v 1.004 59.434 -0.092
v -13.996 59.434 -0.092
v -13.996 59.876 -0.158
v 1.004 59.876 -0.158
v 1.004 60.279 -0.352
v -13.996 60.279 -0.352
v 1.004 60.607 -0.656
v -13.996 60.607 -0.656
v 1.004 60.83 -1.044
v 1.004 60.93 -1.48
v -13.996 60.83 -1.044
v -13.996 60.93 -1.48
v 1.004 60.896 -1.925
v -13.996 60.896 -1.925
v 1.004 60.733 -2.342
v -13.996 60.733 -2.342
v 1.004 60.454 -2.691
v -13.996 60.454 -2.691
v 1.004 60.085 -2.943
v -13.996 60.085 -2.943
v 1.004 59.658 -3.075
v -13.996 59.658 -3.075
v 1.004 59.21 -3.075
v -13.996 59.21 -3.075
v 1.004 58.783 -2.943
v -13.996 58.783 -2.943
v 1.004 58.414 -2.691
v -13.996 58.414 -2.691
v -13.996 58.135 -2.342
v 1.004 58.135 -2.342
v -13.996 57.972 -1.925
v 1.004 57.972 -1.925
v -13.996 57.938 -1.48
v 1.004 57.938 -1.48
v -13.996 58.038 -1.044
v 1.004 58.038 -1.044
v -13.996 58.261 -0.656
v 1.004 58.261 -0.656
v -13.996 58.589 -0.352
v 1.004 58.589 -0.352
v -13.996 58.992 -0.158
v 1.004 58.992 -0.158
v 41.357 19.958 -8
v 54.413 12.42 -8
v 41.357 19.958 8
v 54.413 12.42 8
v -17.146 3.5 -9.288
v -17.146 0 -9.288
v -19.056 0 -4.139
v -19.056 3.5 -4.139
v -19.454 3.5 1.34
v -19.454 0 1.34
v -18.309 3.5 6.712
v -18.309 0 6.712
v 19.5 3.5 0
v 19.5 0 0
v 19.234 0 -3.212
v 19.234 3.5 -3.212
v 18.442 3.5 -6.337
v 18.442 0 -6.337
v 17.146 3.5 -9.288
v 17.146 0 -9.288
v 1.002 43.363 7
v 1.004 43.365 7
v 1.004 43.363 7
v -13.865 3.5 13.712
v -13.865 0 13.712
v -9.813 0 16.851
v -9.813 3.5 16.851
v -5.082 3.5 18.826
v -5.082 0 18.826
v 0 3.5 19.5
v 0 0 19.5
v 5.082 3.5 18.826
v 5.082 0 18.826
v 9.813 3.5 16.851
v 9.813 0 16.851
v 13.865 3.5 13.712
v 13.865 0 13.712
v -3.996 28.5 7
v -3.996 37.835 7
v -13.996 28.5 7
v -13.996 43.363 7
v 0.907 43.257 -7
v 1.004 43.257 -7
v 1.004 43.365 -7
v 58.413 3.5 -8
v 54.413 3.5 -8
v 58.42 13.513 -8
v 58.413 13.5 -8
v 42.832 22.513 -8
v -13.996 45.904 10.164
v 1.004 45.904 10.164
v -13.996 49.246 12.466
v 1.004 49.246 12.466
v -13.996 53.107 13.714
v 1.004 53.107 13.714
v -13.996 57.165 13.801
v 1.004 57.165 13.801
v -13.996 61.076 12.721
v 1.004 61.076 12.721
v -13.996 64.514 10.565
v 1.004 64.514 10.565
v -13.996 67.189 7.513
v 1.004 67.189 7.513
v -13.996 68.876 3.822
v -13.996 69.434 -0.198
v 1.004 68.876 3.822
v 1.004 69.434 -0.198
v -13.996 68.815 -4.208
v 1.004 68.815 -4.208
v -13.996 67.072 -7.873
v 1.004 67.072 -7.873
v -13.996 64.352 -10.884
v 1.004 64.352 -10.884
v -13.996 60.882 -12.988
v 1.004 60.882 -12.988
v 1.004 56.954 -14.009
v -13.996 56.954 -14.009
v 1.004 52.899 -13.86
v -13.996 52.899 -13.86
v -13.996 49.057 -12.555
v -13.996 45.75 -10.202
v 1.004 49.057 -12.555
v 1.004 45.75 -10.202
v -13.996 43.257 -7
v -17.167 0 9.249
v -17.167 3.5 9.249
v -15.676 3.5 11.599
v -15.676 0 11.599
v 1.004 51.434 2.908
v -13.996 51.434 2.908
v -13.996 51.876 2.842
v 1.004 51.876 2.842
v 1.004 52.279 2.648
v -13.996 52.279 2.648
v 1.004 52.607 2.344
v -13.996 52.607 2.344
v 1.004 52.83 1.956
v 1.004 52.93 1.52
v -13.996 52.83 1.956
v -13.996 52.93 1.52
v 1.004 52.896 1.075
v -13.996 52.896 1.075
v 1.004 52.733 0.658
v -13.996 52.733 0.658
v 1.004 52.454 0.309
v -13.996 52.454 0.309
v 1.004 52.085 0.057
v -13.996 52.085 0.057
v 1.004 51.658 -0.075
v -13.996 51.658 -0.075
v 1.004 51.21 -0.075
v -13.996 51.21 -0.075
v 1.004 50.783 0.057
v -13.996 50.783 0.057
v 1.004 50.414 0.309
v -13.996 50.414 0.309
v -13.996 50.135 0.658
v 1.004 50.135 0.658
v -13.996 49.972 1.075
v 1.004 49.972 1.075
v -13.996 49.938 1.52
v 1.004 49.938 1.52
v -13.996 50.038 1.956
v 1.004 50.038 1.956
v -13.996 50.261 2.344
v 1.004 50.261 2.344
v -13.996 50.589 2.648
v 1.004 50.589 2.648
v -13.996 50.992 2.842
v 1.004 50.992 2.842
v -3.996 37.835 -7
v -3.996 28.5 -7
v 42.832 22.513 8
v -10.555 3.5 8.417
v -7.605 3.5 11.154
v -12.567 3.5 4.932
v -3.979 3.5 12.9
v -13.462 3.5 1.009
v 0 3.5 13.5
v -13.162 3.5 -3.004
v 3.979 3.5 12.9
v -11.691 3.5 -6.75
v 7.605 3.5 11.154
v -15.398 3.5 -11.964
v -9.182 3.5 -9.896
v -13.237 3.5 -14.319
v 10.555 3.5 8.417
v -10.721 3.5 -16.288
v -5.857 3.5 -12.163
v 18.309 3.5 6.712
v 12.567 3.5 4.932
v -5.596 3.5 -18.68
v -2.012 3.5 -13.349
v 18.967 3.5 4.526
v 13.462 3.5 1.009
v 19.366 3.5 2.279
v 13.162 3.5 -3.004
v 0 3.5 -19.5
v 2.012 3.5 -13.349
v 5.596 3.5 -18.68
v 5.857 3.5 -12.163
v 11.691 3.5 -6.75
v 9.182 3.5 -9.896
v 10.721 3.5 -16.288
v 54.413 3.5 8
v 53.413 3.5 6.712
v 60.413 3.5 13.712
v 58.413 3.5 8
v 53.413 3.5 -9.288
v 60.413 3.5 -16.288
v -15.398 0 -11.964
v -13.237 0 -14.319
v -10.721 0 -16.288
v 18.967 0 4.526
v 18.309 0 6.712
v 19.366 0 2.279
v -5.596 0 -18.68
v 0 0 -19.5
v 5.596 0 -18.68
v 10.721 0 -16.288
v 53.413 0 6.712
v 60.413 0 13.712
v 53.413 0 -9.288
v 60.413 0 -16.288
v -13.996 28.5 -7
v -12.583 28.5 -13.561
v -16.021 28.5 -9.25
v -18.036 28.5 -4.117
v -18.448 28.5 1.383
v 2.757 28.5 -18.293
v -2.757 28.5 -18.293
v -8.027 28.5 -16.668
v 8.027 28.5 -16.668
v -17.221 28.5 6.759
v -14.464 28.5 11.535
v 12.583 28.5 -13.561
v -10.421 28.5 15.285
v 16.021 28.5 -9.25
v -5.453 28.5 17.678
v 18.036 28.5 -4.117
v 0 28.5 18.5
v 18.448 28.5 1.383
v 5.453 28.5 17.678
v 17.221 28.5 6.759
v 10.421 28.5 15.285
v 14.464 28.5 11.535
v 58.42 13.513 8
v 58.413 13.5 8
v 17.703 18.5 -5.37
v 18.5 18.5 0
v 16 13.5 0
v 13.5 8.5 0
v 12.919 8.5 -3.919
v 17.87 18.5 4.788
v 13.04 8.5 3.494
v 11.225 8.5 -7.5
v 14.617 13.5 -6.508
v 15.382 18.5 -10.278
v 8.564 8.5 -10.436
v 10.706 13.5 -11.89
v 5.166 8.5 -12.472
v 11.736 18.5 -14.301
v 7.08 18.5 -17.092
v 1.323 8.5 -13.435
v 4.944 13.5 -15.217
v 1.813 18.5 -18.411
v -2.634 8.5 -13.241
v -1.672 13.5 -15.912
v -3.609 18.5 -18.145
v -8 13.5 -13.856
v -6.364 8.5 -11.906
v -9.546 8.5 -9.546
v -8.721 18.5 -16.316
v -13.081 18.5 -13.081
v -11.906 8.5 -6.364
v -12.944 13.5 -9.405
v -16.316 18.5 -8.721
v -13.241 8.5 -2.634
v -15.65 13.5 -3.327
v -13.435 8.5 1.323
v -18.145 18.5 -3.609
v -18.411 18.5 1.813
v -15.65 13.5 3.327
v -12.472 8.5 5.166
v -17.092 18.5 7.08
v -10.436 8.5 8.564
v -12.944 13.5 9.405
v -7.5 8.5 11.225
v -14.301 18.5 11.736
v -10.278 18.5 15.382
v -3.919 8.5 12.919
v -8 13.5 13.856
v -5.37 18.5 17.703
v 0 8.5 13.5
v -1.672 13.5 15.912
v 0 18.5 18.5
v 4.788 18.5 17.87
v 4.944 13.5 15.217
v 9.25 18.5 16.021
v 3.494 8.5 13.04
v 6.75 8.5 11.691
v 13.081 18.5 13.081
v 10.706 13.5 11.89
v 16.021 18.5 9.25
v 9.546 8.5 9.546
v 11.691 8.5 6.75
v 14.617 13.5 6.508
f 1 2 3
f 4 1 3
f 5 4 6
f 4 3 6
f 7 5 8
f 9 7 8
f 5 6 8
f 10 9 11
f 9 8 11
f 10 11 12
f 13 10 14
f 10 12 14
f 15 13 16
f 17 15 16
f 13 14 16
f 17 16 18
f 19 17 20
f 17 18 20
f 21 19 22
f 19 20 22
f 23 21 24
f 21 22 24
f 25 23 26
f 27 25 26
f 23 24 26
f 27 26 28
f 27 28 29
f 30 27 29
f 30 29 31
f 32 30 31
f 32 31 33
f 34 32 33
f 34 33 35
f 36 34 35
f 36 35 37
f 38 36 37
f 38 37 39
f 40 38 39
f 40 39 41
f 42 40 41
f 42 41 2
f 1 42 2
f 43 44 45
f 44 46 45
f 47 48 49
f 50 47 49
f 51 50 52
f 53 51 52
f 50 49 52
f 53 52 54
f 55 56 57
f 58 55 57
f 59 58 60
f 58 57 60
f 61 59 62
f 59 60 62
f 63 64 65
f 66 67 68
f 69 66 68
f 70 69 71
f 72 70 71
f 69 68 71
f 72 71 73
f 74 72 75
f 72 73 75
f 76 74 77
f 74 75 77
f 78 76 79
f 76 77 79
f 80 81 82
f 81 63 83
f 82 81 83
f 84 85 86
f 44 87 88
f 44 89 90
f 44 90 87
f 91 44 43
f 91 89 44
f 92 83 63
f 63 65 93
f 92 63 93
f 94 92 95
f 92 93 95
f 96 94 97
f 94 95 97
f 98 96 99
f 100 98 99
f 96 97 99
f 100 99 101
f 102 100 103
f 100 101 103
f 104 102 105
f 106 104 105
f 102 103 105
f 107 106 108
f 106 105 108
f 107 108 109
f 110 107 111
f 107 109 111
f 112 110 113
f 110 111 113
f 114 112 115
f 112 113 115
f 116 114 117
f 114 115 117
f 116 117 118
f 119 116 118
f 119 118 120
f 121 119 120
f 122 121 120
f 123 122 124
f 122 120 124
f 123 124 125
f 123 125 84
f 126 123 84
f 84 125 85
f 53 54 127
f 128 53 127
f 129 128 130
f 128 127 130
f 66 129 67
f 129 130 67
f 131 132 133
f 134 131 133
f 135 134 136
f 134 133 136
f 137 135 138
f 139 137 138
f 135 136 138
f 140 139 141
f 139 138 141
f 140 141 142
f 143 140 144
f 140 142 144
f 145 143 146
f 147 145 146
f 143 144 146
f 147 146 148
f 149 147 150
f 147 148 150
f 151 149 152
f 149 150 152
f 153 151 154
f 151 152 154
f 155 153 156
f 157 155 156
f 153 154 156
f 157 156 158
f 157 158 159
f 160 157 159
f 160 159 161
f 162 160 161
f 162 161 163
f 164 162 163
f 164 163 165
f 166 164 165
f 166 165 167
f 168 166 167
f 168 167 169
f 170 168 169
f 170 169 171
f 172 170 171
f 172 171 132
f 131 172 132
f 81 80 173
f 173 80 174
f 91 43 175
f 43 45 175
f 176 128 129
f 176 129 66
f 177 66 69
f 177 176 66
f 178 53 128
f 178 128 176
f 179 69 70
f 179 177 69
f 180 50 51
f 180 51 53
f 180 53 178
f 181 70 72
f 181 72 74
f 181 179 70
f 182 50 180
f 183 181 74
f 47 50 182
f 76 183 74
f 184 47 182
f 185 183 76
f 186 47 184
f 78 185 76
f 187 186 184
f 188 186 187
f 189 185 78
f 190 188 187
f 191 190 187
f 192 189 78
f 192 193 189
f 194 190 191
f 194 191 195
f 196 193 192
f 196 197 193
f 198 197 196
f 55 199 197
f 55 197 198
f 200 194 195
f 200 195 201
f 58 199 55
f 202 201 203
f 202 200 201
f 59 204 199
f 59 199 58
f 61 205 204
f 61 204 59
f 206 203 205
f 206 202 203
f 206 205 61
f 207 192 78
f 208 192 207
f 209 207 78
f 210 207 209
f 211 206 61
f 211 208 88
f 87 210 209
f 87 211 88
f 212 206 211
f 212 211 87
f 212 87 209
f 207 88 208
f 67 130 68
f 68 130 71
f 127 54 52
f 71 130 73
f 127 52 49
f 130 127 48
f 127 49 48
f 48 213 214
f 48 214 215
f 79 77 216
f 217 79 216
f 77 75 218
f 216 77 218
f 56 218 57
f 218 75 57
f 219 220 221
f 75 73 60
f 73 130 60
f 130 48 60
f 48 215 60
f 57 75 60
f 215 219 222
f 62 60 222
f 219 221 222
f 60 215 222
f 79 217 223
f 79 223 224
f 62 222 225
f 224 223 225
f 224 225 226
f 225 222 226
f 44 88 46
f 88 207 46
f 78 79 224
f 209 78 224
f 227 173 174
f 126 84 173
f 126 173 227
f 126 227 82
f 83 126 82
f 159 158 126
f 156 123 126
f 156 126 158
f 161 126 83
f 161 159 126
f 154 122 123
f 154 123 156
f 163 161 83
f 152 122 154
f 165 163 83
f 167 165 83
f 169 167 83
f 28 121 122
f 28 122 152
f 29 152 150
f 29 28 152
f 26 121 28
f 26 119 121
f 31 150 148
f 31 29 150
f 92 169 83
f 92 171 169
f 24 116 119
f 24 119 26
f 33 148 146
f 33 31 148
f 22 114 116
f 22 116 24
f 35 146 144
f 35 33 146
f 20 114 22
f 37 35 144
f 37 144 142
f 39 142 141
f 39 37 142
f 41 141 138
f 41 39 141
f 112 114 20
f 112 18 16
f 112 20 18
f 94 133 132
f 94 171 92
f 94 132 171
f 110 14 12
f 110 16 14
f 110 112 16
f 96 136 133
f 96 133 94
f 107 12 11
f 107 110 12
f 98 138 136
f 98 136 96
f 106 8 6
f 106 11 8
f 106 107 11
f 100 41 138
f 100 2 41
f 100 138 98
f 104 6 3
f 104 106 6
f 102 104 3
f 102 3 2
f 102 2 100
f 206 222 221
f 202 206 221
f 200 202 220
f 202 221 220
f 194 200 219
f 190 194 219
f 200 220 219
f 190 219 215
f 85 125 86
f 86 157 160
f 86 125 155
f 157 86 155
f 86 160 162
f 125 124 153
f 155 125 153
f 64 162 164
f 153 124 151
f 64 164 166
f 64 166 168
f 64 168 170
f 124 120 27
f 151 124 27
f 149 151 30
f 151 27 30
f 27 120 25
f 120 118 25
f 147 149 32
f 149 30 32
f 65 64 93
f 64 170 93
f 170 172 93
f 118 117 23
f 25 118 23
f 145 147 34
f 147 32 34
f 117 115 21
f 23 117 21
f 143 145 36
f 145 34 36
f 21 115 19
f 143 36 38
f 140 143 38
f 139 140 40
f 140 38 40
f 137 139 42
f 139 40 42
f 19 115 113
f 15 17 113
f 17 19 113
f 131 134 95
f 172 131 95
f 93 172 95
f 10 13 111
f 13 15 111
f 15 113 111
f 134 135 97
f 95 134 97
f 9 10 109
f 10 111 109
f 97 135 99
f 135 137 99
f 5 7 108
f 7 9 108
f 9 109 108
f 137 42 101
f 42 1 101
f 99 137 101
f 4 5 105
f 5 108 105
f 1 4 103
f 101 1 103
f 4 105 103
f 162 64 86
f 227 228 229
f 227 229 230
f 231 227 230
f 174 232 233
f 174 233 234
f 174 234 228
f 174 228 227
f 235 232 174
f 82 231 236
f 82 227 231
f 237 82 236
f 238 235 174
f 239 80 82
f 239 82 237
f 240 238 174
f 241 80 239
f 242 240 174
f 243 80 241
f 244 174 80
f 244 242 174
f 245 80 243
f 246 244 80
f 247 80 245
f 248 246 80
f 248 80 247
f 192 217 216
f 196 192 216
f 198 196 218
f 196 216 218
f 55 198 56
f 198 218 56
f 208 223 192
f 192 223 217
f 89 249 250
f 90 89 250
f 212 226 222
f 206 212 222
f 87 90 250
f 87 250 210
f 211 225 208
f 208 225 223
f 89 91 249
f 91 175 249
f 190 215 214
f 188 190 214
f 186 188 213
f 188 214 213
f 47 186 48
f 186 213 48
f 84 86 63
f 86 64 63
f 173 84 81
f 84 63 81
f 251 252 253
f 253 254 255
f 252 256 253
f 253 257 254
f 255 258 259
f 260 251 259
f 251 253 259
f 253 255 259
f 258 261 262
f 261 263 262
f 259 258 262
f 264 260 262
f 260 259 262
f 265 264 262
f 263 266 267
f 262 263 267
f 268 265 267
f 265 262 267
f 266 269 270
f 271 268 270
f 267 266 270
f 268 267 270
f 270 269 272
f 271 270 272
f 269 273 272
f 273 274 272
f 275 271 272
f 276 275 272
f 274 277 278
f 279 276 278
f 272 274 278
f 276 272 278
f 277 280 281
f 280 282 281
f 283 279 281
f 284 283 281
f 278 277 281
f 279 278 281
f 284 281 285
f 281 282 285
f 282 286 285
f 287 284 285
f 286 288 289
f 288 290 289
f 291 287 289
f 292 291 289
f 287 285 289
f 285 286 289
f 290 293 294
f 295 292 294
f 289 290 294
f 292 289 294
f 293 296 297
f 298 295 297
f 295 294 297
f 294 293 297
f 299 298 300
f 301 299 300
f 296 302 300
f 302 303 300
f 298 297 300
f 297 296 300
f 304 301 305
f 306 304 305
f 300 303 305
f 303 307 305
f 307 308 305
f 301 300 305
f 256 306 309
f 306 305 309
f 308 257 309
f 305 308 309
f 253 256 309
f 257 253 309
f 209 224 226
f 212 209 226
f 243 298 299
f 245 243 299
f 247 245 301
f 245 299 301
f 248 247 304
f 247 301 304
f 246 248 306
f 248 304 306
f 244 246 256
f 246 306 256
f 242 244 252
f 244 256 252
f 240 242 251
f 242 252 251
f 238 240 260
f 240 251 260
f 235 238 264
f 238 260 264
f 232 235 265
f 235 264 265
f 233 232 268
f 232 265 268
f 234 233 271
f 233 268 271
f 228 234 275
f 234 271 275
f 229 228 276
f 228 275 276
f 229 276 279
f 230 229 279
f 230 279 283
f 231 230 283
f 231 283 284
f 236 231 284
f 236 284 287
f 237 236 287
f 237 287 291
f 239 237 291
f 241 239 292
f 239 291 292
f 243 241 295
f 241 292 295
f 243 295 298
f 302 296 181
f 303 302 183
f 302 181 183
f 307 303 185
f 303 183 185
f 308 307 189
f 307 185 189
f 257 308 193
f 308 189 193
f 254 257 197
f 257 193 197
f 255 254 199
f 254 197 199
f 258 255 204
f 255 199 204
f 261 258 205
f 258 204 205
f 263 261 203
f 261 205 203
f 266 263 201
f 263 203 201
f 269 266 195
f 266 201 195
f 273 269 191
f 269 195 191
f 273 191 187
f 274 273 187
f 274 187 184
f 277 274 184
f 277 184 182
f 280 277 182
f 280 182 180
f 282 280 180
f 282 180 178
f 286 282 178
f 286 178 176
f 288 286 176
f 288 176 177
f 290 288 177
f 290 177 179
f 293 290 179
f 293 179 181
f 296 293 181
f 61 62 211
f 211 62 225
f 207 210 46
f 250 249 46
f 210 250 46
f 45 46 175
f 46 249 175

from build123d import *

# Parameters (mm, degrees)
SALIENTE_EXTRUIR1_DEPTH = 3.5
CROQUIS2_R              = 13.5
SALIENTE_EXTRUIR2_DEPTH = 5
CROQUIS4_R              = 18.5
CROQUIS5_R              = 13.5
CROQUIS6_R              = 18.5
SALIENTE_EXTRUIR3_DEPTH = 10
CROQUIS7_W              = 10
CROQUIS7_H              = 14
SALIENTE_EXTRUIR4_DEPTH = 9.335
SALIENTE_EXTRUIR5_DEPTH = 7
SALIENTE_EXTRUIR6_DEPTH = 15
SALIENTE_EXTRUIR7_DEPTH = 8
CROQUIS11_R             = 1.5
CORTAR_EXTRUIR1_DEPTH   = 104.624142837


with BuildPart() as part:
    # Croquis1 → Saliente-Extruir1 (new body)
    with BuildSketch(Plane(origin=(0, 0, 0), x_dir=(1, 0, 0), z_dir=(0, 1, 0))):
        with BuildLine():
            Line((13.865110625, -13.711626722), (60.412611283, -13.711626722))
            Line((60.412611283, -13.711626722), (60.412611283, 16.288373278))
            Line((60.412611283, 16.288373278), (10.720955925, 16.288373278))
            ThreePointArc((10.720955925, 16.288373278), (-19.393779083, -2.032568055), (13.865110625, -13.711626722))
        make_face()
        with BuildLine():
            Line((53.412611283, -6.711626722), (18.308579048, -6.711626722))
            ThreePointArc((18.308579048, -6.711626722), (19.448702808, 1.413491806), (17.145731884, 9.288373278))
            Line((17.145731884, 9.288373278), (53.412611283, 9.288373278))
            Line((53.412611283, 9.288373278), (53.412611283, -6.711626722))
        make_face(mode=Mode.SUBTRACT)
    extrude(amount=SALIENTE_EXTRUIR1_DEPTH)

    # Croquis2 → Saliente-Extruir2 (add)
    with BuildSketch(Plane(origin=(0, 3.5, 0), x_dir=(1, 0, 0), z_dir=(0, 1, 0))):
        Circle(CROQUIS2_R)
    extrude(amount=SALIENTE_EXTRUIR2_DEPTH)

    # Croquis4 → Recubrir2 section 0
    with BuildSketch(Plane(origin=(0, 18.5, 0), x_dir=(1, 0, 0), z_dir=(0, 1, 0))):
        Circle(CROQUIS4_R)
    # Croquis5 → Recubrir2 section 1
    with BuildSketch(Plane(origin=(0, 8.5, 0), x_dir=(1, 0, 0), z_dir=(0, 1, 0))):
        Circle(CROQUIS5_R)
    loft()

    # Croquis6 → Saliente-Extruir3 (add)
    with BuildSketch(Plane(origin=(0, 18.5, 0), x_dir=(1, 0, 0), z_dir=(0, 1, 0))):
        Circle(CROQUIS6_R)
    extrude(amount=SALIENTE_EXTRUIR3_DEPTH)

    # Croquis7 → Saliente-Extruir4 (add)
    with BuildSketch(Plane(origin=(0, 28.5, 0), x_dir=(1, 0, 0), z_dir=(0, 1, 0))):
        with Locations((-8.995895444, 0)):
            Rectangle(CROQUIS7_W, CROQUIS7_H)
    extrude(amount=SALIENTE_EXTRUIR4_DEPTH)

    # Croquis8 → Saliente-Extruir5 (add, symmetric)
    with BuildSketch(Plane.XY):
        Polygon((-13.995895444, 37.835), (-13.995895444, 43.365), (1.004104556, 43.365), (-3.995895444, 37.835), align=None)
    extrude(amount=SALIENTE_EXTRUIR5_DEPTH, both=True)

    # Croquis9 → Saliente-Extruir6 (add)
    with BuildSketch(Plane.ZY.offset(13.995895444)):
        with BuildLine():
            Line((-7, 43.257226645), (-7, 43.365))
            Line((-7, 43.365), (7, 43.365))
            Line((7, 43.365), (7, 43.363083448))
            ThreePointArc((7, 43.363083448), (12.059118842, 48.480035252), (13.908328814, 55.434048604))
            ThreePointArc((13.908328814, 55.434048604), (-7.13735769, 67.531912122), (-7, 43.257226645))
        make_face()
    extrude(amount=-SALIENTE_EXTRUIR6_DEPTH)

    # Croquis10 → Saliente-Extruir7 (add, symmetric)
    with BuildSketch(Plane.XY):
        Polygon((58.412611283, 3.5), (54.412611283, 3.5), (54.412611283, 12.42), (41.356500297, 19.957949192), (42.831821975, 22.513281297), (58.420279243, 13.513281297), (58.412611283, 13.5), align=None)
    extrude(amount=SALIENTE_EXTRUIR7_DEPTH, both=True)

    # Croquis11 → Cortar-Extruir1 (cut, through all)
    with BuildSketch(Plane.ZY.offset(13.995895444)):
        with Locations((-1.591671186, 59.434048604)):
            Circle(CROQUIS11_R)
        with Locations((1.408328814, 51.434048604)):
            Circle(CROQUIS11_R)
    extrude(amount=-CORTAR_EXTRUIR1_DEPTH, mode=Mode.SUBTRACT)


solid = part.part
